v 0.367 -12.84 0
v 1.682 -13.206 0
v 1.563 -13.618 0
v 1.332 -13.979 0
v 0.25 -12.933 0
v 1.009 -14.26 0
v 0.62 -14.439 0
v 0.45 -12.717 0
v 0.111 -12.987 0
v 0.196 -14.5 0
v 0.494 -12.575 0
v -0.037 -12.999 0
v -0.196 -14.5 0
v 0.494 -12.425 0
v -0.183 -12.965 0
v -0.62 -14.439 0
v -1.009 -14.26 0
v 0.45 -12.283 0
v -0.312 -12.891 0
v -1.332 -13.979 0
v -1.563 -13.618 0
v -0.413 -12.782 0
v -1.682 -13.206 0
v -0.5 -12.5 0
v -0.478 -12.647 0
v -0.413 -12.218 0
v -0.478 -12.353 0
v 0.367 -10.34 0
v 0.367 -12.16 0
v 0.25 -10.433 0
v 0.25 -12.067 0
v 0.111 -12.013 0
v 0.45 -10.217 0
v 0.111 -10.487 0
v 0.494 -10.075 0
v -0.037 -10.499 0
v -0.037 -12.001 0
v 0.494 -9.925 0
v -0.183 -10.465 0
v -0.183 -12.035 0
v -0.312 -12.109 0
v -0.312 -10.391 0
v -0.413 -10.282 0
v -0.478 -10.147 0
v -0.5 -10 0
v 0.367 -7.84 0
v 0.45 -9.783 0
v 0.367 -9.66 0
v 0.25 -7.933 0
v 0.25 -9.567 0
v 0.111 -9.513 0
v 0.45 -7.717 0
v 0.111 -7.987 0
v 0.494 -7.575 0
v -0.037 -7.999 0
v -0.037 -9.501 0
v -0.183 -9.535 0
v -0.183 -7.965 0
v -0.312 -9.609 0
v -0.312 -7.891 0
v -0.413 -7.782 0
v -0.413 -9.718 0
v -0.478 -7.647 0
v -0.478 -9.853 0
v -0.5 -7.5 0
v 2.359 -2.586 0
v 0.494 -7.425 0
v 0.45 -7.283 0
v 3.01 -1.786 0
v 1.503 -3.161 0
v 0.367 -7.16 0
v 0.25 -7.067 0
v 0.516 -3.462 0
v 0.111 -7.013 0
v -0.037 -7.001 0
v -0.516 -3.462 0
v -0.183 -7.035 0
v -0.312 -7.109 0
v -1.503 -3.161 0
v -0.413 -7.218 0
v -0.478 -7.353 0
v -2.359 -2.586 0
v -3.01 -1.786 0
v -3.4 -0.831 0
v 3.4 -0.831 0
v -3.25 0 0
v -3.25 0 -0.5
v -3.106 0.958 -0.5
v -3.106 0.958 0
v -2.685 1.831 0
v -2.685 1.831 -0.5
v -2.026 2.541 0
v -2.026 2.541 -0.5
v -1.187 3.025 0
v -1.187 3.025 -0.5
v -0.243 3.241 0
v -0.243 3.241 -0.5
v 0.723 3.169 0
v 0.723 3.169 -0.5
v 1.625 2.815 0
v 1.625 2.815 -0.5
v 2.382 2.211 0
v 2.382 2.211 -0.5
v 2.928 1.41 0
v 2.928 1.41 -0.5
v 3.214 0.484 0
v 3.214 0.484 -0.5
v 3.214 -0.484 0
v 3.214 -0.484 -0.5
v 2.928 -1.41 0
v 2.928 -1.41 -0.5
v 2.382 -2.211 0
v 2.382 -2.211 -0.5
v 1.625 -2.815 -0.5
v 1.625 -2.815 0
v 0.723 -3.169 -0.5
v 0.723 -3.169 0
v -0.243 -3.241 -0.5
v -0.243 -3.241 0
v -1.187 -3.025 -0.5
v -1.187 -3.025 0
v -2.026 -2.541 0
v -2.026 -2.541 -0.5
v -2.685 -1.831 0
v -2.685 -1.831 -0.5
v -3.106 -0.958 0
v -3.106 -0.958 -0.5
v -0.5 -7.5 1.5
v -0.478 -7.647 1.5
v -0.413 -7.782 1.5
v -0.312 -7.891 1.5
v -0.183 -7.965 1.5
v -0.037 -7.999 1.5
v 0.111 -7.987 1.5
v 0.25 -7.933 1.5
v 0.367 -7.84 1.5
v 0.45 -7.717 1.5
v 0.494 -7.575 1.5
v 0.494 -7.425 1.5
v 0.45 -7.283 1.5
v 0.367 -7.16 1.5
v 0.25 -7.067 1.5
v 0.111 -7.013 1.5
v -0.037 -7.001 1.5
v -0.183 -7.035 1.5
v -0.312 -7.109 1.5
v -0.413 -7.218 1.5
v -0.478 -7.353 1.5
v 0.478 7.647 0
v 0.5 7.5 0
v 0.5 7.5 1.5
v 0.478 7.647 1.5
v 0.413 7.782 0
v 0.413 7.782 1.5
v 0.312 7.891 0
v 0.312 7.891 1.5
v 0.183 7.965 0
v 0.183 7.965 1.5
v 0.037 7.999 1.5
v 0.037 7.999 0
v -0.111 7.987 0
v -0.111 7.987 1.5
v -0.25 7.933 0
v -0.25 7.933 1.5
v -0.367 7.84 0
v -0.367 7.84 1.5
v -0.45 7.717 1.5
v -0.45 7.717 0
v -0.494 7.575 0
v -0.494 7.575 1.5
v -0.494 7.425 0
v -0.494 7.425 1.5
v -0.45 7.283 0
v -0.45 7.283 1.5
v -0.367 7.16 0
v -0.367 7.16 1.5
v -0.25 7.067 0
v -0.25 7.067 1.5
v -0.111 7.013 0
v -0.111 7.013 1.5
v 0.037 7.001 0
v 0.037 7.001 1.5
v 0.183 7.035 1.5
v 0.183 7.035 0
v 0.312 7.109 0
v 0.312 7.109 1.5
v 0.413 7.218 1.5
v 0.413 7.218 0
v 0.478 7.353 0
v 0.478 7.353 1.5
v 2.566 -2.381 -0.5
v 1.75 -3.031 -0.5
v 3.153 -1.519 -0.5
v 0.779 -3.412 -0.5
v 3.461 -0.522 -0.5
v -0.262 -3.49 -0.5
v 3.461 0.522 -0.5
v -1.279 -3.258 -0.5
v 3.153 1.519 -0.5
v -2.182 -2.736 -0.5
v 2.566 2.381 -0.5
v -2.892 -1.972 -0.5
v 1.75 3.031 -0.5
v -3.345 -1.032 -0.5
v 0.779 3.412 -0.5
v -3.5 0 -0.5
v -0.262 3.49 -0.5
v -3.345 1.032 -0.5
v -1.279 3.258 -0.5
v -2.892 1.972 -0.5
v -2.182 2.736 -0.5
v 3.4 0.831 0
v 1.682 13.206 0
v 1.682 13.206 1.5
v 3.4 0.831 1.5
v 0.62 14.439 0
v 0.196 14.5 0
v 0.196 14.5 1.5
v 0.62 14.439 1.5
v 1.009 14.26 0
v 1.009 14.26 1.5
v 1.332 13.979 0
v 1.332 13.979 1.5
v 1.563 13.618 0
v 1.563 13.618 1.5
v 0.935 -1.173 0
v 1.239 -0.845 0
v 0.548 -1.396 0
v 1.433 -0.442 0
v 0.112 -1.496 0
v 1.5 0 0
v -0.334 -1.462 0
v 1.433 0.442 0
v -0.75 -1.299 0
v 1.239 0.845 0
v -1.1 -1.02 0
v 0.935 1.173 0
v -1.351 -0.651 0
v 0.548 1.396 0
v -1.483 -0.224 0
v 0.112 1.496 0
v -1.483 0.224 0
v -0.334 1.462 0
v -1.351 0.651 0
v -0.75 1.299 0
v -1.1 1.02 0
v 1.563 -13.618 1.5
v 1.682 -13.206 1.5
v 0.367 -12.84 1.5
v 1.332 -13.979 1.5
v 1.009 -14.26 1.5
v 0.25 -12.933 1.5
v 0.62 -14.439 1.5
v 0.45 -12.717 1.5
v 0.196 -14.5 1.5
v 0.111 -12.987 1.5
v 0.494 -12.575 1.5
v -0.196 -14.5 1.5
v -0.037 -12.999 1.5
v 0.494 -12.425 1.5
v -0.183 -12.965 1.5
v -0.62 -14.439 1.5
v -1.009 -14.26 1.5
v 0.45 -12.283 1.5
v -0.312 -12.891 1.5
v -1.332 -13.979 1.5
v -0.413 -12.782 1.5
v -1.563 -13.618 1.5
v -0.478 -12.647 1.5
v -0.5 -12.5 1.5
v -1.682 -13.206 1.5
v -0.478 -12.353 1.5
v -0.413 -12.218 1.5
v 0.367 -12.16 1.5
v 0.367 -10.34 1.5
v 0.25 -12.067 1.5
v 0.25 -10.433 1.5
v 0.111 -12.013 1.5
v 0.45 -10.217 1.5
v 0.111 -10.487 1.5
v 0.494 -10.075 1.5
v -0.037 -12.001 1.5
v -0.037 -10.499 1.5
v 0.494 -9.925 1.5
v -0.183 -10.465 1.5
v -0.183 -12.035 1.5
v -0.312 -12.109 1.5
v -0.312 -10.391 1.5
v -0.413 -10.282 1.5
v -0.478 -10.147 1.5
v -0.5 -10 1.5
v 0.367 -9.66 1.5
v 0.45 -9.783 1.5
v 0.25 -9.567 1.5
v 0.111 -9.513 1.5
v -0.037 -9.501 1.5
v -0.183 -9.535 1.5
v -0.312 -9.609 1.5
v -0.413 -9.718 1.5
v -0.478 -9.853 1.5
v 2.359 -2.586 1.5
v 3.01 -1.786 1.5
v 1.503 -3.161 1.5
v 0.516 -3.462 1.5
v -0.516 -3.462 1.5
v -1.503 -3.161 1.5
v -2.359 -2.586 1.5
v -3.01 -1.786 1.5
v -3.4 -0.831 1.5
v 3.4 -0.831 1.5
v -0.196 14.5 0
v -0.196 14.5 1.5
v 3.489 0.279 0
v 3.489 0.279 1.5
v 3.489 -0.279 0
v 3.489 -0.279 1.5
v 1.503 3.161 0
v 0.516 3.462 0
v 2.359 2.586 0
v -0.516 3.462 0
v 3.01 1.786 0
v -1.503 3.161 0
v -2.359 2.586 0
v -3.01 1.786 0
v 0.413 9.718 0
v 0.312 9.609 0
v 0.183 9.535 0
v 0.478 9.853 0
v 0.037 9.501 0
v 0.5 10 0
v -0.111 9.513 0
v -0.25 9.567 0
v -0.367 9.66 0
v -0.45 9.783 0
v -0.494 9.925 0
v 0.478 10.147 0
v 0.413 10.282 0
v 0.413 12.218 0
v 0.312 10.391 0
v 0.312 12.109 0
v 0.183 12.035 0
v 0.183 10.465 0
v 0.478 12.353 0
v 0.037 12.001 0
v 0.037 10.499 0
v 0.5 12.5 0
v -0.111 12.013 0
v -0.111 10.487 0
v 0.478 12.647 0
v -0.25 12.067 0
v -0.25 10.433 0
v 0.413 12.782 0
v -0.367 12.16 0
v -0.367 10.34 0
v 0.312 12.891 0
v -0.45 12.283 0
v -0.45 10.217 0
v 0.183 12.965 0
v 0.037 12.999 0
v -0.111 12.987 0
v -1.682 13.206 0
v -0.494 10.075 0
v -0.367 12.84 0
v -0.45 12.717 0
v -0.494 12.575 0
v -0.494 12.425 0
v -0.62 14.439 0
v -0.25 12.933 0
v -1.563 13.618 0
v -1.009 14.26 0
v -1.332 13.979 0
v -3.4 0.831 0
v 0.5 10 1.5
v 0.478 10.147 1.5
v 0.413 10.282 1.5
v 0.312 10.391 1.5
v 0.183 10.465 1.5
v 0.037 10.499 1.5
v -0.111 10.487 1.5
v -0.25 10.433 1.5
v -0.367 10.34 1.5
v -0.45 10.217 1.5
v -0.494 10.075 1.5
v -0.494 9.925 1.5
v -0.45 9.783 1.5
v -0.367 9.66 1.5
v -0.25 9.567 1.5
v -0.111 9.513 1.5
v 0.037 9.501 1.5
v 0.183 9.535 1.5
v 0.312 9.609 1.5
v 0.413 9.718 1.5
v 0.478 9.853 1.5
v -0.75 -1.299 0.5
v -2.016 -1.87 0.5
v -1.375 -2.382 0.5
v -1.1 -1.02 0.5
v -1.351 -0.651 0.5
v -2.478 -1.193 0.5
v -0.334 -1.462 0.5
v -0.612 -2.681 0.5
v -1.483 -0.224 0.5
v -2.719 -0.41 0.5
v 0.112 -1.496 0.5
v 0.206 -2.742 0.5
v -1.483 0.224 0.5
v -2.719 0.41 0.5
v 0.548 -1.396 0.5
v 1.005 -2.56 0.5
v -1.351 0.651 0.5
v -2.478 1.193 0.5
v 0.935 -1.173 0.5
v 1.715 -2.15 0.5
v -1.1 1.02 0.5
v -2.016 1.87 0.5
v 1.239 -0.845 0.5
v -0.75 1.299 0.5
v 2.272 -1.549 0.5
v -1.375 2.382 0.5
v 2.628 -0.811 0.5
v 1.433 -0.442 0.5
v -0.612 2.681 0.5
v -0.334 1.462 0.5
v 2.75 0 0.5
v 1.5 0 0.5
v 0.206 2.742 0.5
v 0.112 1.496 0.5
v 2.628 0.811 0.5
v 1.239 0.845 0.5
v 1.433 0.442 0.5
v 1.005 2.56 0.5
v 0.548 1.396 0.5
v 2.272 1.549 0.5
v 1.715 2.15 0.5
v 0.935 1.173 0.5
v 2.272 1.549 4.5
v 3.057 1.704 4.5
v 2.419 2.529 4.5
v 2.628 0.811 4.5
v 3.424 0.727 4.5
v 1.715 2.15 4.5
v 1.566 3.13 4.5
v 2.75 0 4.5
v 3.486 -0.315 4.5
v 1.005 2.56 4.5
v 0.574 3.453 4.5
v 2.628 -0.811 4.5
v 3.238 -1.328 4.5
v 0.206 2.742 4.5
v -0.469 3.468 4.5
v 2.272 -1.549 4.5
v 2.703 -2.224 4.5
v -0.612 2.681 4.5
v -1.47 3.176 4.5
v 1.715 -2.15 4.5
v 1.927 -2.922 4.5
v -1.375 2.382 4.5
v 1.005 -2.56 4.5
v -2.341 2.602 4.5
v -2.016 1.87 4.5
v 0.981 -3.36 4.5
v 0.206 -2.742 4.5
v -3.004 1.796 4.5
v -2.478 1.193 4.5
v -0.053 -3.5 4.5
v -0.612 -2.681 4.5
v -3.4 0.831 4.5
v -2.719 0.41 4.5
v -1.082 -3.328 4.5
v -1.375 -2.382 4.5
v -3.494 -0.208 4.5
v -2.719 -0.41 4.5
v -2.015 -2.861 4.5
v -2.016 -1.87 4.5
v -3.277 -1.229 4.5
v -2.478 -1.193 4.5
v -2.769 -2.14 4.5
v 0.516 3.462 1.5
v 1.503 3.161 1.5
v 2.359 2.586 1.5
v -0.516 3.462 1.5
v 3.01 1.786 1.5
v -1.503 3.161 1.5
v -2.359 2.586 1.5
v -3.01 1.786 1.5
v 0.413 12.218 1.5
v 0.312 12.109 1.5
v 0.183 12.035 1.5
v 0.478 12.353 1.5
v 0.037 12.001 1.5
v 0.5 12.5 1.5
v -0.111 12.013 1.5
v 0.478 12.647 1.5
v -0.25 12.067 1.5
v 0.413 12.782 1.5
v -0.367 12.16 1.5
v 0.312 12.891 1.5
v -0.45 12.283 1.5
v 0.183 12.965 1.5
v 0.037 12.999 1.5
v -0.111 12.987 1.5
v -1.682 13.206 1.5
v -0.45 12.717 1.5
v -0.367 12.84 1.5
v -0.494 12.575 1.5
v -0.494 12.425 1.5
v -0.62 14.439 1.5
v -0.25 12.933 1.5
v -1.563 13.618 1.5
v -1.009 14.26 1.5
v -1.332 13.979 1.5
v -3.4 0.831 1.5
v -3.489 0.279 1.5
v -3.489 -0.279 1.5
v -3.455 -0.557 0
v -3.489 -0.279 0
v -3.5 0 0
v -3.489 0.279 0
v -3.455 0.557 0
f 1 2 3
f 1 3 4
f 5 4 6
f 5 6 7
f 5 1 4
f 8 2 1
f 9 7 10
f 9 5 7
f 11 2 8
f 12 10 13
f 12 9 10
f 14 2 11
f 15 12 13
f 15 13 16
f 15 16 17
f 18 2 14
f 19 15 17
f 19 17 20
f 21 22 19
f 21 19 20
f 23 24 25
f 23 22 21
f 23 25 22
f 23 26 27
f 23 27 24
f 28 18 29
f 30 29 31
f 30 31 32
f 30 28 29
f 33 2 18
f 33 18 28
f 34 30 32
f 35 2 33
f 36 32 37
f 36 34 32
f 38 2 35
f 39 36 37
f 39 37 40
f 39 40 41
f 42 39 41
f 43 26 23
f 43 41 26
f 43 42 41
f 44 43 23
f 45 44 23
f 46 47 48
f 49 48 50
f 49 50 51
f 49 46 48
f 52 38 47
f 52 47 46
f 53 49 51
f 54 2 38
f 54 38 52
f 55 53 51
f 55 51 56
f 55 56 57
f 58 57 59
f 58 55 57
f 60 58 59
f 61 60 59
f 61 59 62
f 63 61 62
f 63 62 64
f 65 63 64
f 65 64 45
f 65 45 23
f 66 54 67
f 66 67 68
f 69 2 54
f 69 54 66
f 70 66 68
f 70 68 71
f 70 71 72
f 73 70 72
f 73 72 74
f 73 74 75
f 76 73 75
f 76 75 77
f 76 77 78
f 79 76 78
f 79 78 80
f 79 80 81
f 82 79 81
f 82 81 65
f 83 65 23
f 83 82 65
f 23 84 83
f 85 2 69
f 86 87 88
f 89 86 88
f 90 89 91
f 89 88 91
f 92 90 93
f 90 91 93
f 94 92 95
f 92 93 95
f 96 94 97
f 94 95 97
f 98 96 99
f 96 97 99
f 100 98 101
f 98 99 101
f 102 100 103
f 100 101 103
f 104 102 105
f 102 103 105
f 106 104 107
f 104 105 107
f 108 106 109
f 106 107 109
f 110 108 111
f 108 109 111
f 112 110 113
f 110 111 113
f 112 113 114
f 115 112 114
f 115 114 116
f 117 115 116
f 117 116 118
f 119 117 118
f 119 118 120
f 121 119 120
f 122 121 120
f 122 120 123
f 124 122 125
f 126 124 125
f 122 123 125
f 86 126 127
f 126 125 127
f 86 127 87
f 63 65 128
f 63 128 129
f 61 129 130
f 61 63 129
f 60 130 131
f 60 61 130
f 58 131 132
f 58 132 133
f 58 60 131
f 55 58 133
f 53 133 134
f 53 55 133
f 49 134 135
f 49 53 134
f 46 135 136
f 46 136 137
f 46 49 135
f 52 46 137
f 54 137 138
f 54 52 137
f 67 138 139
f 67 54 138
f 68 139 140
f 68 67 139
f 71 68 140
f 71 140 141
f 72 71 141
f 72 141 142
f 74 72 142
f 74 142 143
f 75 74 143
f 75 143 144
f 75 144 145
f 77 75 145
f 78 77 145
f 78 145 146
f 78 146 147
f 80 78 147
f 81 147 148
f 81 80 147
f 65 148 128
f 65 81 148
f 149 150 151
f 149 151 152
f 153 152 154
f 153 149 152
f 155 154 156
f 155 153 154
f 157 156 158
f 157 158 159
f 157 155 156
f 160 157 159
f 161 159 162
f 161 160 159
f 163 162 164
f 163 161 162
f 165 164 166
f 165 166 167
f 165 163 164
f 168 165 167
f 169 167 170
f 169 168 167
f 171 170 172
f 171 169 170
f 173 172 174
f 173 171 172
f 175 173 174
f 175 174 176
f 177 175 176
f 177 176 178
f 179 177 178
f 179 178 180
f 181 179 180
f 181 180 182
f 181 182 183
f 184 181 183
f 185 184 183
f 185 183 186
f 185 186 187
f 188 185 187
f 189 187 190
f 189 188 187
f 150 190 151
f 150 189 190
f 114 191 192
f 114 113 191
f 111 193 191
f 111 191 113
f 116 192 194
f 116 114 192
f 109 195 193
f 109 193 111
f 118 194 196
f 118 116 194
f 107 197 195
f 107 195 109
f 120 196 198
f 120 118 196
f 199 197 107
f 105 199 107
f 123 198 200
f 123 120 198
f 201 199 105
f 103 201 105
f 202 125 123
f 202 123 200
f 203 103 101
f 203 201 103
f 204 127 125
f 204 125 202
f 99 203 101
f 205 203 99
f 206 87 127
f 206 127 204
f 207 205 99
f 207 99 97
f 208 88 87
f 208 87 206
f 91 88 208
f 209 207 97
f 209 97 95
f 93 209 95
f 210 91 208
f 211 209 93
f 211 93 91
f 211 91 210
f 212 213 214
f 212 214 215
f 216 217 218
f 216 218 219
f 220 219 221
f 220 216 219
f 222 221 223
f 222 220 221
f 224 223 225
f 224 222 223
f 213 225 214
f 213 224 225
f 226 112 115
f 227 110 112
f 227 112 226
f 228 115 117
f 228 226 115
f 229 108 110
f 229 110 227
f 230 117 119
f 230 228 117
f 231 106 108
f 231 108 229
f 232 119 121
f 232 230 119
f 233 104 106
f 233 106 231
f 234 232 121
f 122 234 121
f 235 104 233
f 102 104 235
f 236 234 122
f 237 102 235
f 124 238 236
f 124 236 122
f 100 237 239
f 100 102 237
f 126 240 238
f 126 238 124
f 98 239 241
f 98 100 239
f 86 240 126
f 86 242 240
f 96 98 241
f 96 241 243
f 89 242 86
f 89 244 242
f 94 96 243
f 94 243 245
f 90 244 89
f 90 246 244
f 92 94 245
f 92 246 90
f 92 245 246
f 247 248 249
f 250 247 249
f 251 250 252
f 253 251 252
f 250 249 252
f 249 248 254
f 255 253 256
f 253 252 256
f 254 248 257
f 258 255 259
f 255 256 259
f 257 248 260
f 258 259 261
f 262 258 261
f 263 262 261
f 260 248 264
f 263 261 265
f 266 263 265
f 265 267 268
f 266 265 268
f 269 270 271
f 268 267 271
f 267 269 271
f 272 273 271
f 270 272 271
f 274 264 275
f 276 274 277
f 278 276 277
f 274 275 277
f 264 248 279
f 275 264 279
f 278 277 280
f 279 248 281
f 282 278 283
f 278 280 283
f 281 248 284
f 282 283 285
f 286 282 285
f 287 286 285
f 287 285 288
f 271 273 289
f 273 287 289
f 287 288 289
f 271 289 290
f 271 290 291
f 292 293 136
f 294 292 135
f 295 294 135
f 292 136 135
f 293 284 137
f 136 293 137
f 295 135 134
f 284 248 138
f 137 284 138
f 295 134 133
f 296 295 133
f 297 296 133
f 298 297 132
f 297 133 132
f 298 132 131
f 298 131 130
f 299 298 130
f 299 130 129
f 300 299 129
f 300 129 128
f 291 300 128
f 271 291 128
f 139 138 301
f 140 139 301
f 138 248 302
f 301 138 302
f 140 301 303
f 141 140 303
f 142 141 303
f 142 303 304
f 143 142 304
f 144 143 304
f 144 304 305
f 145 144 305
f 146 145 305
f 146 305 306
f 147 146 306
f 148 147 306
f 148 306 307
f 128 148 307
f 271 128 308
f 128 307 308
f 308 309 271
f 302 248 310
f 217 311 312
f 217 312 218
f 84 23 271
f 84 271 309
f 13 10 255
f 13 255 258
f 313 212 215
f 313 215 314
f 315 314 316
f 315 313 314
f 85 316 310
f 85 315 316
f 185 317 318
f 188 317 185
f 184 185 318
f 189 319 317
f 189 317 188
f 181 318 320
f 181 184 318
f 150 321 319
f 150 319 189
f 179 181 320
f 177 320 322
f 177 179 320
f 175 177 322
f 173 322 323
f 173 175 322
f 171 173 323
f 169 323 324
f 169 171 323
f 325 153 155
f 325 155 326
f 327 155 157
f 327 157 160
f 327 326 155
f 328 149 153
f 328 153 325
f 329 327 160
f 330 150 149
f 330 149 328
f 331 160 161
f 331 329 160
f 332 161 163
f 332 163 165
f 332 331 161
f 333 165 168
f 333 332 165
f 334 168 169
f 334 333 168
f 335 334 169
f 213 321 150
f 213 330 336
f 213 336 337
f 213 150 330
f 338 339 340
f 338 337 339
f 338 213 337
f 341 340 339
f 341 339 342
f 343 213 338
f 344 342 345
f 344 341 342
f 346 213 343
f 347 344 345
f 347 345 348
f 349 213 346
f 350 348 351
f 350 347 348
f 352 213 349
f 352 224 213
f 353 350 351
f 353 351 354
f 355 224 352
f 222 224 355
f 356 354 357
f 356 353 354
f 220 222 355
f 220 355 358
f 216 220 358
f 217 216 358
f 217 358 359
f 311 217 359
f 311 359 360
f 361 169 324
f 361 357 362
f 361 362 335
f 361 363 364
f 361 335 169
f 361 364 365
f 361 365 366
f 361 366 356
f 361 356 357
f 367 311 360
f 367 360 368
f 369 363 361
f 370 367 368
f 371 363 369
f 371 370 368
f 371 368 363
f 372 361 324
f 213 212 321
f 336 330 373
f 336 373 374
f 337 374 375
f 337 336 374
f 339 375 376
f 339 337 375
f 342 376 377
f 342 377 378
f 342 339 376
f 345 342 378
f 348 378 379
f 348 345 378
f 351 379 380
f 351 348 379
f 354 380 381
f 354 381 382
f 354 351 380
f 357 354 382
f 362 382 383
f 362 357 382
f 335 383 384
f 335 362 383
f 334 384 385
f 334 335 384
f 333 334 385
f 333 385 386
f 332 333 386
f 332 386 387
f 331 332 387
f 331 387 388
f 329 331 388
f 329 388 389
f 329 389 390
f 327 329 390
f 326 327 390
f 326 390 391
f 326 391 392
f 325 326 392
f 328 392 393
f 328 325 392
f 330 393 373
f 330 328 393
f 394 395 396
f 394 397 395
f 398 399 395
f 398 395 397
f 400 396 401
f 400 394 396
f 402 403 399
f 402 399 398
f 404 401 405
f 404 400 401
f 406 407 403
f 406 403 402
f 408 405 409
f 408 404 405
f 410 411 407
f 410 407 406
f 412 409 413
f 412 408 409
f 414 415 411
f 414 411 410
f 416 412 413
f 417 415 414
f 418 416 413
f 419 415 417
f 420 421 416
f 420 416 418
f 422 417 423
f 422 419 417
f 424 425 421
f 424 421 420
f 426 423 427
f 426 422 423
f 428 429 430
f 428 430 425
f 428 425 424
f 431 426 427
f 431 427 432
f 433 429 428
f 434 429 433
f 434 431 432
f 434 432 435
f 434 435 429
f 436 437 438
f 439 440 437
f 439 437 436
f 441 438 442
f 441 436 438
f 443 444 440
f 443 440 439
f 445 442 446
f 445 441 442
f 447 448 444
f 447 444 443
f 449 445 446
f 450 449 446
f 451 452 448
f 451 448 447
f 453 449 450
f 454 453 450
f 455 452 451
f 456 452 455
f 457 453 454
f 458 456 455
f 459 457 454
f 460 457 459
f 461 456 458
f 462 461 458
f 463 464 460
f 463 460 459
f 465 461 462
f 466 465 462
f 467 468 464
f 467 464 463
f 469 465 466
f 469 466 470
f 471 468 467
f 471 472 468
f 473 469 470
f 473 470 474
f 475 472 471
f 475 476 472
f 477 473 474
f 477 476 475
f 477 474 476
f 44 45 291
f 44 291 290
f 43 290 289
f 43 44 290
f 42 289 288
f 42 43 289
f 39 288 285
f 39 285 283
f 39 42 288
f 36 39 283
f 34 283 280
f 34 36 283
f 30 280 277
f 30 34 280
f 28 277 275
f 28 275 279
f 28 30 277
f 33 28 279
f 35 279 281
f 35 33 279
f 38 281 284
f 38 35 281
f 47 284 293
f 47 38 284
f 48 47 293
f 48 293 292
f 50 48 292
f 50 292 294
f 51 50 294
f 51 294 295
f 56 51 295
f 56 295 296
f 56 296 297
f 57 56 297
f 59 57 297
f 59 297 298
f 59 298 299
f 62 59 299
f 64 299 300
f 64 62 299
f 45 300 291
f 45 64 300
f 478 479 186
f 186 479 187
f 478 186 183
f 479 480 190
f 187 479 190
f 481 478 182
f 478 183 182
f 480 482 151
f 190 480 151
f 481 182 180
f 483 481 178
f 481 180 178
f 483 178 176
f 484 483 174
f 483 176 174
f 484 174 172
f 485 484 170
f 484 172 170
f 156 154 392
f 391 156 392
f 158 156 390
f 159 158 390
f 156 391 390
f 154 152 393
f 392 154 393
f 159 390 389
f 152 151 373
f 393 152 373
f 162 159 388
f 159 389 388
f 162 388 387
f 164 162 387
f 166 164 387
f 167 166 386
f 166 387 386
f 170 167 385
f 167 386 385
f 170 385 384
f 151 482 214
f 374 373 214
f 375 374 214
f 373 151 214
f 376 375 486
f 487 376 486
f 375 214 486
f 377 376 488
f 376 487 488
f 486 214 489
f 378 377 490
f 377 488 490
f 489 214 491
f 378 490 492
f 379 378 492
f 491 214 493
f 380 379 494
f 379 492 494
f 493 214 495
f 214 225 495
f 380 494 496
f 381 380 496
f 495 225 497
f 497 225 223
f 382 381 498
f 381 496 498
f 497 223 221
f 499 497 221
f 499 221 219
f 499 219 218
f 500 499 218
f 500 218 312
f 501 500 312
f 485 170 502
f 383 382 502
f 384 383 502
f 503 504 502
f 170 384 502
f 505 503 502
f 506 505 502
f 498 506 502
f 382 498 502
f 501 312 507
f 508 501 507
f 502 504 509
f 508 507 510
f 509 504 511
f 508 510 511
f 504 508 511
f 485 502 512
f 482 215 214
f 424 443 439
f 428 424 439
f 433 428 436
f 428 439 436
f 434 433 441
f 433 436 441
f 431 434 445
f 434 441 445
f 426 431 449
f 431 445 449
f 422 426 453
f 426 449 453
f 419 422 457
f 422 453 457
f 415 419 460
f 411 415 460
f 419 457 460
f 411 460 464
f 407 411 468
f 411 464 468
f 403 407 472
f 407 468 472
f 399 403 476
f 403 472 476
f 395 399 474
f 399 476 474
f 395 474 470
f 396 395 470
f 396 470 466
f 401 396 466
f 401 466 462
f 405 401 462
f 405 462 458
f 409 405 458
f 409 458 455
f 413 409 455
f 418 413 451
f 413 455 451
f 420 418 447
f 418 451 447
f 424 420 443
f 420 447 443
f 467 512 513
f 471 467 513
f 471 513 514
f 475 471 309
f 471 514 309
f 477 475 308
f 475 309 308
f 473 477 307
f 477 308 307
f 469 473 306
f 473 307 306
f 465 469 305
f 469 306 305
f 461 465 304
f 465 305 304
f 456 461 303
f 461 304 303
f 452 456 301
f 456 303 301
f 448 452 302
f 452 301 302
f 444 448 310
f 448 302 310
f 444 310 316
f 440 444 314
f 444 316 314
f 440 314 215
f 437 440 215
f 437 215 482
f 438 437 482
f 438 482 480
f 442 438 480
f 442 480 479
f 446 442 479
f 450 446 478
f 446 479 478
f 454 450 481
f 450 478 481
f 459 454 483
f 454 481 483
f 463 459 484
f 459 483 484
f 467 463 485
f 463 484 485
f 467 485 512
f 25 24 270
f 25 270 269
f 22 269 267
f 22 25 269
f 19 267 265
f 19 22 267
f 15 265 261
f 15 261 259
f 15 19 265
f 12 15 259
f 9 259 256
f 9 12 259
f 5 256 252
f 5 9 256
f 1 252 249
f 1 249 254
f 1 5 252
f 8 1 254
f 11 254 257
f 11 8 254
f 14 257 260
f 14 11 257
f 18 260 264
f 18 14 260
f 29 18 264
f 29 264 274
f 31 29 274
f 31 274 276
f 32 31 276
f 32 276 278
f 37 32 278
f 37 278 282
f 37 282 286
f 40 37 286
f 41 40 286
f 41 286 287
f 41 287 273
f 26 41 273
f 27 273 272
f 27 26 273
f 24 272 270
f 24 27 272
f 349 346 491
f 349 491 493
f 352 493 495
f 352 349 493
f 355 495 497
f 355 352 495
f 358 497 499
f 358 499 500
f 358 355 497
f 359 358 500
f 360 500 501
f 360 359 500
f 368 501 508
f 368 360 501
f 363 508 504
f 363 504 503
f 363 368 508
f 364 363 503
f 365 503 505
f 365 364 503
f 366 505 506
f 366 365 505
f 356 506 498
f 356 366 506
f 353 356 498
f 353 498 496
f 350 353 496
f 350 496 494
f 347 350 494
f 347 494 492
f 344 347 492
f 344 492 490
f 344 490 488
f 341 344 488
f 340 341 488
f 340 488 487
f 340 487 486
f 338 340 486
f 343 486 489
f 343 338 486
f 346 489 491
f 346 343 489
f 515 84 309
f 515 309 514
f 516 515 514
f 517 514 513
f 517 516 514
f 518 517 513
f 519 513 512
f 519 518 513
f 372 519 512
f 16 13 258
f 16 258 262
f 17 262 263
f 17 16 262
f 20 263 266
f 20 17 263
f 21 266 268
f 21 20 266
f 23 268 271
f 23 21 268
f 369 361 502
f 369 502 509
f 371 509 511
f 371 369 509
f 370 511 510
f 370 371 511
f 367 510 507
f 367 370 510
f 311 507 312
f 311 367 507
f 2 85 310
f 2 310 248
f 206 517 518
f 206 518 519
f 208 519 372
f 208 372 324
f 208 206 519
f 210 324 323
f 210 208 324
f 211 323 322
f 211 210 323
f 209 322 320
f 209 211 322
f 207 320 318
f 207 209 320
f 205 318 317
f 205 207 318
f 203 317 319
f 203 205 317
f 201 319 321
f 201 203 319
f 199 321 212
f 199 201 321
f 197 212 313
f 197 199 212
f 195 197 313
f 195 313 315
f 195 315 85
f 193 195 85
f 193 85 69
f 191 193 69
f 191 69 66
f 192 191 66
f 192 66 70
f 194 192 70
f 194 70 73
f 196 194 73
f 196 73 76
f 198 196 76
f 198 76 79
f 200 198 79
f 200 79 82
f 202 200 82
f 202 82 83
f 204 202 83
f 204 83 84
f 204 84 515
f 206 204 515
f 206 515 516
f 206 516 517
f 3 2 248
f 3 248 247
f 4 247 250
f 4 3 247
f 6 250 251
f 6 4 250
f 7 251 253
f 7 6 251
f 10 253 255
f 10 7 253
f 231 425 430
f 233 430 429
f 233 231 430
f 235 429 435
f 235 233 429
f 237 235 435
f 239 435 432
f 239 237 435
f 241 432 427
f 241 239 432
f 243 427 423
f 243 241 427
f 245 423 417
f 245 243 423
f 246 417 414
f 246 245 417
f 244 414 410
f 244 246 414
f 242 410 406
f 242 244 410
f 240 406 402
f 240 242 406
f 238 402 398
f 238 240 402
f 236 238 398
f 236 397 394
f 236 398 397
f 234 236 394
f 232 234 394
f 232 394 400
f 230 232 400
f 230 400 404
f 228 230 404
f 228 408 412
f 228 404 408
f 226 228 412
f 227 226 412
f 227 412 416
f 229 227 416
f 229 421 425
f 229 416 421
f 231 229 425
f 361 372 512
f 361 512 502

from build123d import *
from build123d.topology import SkipClean

# Parameters (mm, degrees)
SKETCH1_R           = 0.5
SKETCH1_R_2         = 1.5
BOSS_EXTRUDE3_DEPTH = 1.5
SKETCH2_R           = 3.5
BOSS_EXTRUDE4_DEPTH = 3
BOSS_EXTRUDE5_START = 0.5
SKETCH3_R           = 3.5
SKETCH3_R_2         = 3.25
BOSS_EXTRUDE5_DEPTH = 0.5
SKETCH4_R           = 2.75
CUT_EXTRUDE1_DEPTH  = 4


with BuildPart() as part:
    # Sketch1 → Boss-Extrude3 (new body)
    with BuildSketch(Plane.XY):
        with BuildLine():
            Line((-3.4, 0.830662386), (-1.681759988, 13.206282347))
            ThreePointArc((-1.681759988, 13.206282347), (-1.181043929, 14.131243458), (-0.196011829, 14.5))
            Line((-0.196011829, 14.5), (0.196011829, 14.5))
            ThreePointArc((0.196011829, 14.5), (1.181043929, 14.131243458), (1.681759988, 13.206282347))
            Line((1.681759988, 13.206282347), (3.4, 0.830662386))
            ThreePointArc((3.4, 0.830662386), (3.5, 0), (3.4, -0.830662386))
            Line((3.4, -0.830662386), (1.681759988, -13.206282347))
            ThreePointArc((1.681759988, -13.206282347), (1.181043929, -14.131243458), (0.196011829, -14.5))
            Line((0.196011829, -14.5), (-0.196011829, -14.5))
            ThreePointArc((-0.196011829, -14.5), (-1.181043929, -14.131243458), (-1.681759988, -13.206282347))
            Line((-1.681759988, -13.206282347), (-3.4, -0.830662386))
            ThreePointArc((-3.4, -0.830662386), (-3.5, 0), (-3.4, 0.830662386))
        make_face()
        with Locations((0, 10)):
            Circle(SKETCH1_R, mode=Mode.SUBTRACT)
        with Locations((0, 12.5)):
            Circle(SKETCH1_R, mode=Mode.SUBTRACT)
        with Locations((0, 7.5)):
            Circle(SKETCH1_R, mode=Mode.SUBTRACT)
        Circle(SKETCH1_R_2, mode=Mode.SUBTRACT)
        with Locations(Location((0, -7.5, 0), (0, 0, 180))):
            Circle(SKETCH1_R, mode=Mode.SUBTRACT)
        with Locations(Location((0, -12.5, 0), (0, 0, 180))):
            Circle(SKETCH1_R, mode=Mode.SUBTRACT)
        with Locations(Location((0, -10, 0), (0, 0, 180))):
            Circle(SKETCH1_R, mode=Mode.SUBTRACT)
    extrude(amount=BOSS_EXTRUDE3_DEPTH)

    # Sketch2 → Boss-Extrude4 (add)
    with SkipClean():  # the faces are left unmerged after this step: merging them gives an invalid solid
        with BuildSketch(Plane.XY.offset(1.5)):
            with Locations(Location((0, 0, 0), (0, 0, 166.270867325))):
                Circle(SKETCH2_R)
        extrude(amount=BOSS_EXTRUDE4_DEPTH)

    # Sketch3 → Boss-Extrude5 (add)
    with SkipClean():  # the faces are left unmerged after this step: merging them gives an invalid solid
        with BuildSketch(Plane(origin=(0, 0, 0), x_dir=(-1, 0, 0), z_dir=(0, 0, -1)).offset(BOSS_EXTRUDE5_START)):
            Circle(SKETCH3_R)
            Circle(SKETCH3_R_2, mode=Mode.SUBTRACT)
        extrude(amount=-BOSS_EXTRUDE5_DEPTH)

    # Sketch4 → Cut-Extrude1 (cut)
    with SkipClean():  # the faces are left unmerged after this step: merging them gives an invalid solid
        with BuildSketch(Plane.XY.offset(4.5)):
            Circle(SKETCH4_R)
        extrude(amount=-CUT_EXTRUDE1_DEPTH, mode=Mode.SUBTRACT)


solid = part.part
